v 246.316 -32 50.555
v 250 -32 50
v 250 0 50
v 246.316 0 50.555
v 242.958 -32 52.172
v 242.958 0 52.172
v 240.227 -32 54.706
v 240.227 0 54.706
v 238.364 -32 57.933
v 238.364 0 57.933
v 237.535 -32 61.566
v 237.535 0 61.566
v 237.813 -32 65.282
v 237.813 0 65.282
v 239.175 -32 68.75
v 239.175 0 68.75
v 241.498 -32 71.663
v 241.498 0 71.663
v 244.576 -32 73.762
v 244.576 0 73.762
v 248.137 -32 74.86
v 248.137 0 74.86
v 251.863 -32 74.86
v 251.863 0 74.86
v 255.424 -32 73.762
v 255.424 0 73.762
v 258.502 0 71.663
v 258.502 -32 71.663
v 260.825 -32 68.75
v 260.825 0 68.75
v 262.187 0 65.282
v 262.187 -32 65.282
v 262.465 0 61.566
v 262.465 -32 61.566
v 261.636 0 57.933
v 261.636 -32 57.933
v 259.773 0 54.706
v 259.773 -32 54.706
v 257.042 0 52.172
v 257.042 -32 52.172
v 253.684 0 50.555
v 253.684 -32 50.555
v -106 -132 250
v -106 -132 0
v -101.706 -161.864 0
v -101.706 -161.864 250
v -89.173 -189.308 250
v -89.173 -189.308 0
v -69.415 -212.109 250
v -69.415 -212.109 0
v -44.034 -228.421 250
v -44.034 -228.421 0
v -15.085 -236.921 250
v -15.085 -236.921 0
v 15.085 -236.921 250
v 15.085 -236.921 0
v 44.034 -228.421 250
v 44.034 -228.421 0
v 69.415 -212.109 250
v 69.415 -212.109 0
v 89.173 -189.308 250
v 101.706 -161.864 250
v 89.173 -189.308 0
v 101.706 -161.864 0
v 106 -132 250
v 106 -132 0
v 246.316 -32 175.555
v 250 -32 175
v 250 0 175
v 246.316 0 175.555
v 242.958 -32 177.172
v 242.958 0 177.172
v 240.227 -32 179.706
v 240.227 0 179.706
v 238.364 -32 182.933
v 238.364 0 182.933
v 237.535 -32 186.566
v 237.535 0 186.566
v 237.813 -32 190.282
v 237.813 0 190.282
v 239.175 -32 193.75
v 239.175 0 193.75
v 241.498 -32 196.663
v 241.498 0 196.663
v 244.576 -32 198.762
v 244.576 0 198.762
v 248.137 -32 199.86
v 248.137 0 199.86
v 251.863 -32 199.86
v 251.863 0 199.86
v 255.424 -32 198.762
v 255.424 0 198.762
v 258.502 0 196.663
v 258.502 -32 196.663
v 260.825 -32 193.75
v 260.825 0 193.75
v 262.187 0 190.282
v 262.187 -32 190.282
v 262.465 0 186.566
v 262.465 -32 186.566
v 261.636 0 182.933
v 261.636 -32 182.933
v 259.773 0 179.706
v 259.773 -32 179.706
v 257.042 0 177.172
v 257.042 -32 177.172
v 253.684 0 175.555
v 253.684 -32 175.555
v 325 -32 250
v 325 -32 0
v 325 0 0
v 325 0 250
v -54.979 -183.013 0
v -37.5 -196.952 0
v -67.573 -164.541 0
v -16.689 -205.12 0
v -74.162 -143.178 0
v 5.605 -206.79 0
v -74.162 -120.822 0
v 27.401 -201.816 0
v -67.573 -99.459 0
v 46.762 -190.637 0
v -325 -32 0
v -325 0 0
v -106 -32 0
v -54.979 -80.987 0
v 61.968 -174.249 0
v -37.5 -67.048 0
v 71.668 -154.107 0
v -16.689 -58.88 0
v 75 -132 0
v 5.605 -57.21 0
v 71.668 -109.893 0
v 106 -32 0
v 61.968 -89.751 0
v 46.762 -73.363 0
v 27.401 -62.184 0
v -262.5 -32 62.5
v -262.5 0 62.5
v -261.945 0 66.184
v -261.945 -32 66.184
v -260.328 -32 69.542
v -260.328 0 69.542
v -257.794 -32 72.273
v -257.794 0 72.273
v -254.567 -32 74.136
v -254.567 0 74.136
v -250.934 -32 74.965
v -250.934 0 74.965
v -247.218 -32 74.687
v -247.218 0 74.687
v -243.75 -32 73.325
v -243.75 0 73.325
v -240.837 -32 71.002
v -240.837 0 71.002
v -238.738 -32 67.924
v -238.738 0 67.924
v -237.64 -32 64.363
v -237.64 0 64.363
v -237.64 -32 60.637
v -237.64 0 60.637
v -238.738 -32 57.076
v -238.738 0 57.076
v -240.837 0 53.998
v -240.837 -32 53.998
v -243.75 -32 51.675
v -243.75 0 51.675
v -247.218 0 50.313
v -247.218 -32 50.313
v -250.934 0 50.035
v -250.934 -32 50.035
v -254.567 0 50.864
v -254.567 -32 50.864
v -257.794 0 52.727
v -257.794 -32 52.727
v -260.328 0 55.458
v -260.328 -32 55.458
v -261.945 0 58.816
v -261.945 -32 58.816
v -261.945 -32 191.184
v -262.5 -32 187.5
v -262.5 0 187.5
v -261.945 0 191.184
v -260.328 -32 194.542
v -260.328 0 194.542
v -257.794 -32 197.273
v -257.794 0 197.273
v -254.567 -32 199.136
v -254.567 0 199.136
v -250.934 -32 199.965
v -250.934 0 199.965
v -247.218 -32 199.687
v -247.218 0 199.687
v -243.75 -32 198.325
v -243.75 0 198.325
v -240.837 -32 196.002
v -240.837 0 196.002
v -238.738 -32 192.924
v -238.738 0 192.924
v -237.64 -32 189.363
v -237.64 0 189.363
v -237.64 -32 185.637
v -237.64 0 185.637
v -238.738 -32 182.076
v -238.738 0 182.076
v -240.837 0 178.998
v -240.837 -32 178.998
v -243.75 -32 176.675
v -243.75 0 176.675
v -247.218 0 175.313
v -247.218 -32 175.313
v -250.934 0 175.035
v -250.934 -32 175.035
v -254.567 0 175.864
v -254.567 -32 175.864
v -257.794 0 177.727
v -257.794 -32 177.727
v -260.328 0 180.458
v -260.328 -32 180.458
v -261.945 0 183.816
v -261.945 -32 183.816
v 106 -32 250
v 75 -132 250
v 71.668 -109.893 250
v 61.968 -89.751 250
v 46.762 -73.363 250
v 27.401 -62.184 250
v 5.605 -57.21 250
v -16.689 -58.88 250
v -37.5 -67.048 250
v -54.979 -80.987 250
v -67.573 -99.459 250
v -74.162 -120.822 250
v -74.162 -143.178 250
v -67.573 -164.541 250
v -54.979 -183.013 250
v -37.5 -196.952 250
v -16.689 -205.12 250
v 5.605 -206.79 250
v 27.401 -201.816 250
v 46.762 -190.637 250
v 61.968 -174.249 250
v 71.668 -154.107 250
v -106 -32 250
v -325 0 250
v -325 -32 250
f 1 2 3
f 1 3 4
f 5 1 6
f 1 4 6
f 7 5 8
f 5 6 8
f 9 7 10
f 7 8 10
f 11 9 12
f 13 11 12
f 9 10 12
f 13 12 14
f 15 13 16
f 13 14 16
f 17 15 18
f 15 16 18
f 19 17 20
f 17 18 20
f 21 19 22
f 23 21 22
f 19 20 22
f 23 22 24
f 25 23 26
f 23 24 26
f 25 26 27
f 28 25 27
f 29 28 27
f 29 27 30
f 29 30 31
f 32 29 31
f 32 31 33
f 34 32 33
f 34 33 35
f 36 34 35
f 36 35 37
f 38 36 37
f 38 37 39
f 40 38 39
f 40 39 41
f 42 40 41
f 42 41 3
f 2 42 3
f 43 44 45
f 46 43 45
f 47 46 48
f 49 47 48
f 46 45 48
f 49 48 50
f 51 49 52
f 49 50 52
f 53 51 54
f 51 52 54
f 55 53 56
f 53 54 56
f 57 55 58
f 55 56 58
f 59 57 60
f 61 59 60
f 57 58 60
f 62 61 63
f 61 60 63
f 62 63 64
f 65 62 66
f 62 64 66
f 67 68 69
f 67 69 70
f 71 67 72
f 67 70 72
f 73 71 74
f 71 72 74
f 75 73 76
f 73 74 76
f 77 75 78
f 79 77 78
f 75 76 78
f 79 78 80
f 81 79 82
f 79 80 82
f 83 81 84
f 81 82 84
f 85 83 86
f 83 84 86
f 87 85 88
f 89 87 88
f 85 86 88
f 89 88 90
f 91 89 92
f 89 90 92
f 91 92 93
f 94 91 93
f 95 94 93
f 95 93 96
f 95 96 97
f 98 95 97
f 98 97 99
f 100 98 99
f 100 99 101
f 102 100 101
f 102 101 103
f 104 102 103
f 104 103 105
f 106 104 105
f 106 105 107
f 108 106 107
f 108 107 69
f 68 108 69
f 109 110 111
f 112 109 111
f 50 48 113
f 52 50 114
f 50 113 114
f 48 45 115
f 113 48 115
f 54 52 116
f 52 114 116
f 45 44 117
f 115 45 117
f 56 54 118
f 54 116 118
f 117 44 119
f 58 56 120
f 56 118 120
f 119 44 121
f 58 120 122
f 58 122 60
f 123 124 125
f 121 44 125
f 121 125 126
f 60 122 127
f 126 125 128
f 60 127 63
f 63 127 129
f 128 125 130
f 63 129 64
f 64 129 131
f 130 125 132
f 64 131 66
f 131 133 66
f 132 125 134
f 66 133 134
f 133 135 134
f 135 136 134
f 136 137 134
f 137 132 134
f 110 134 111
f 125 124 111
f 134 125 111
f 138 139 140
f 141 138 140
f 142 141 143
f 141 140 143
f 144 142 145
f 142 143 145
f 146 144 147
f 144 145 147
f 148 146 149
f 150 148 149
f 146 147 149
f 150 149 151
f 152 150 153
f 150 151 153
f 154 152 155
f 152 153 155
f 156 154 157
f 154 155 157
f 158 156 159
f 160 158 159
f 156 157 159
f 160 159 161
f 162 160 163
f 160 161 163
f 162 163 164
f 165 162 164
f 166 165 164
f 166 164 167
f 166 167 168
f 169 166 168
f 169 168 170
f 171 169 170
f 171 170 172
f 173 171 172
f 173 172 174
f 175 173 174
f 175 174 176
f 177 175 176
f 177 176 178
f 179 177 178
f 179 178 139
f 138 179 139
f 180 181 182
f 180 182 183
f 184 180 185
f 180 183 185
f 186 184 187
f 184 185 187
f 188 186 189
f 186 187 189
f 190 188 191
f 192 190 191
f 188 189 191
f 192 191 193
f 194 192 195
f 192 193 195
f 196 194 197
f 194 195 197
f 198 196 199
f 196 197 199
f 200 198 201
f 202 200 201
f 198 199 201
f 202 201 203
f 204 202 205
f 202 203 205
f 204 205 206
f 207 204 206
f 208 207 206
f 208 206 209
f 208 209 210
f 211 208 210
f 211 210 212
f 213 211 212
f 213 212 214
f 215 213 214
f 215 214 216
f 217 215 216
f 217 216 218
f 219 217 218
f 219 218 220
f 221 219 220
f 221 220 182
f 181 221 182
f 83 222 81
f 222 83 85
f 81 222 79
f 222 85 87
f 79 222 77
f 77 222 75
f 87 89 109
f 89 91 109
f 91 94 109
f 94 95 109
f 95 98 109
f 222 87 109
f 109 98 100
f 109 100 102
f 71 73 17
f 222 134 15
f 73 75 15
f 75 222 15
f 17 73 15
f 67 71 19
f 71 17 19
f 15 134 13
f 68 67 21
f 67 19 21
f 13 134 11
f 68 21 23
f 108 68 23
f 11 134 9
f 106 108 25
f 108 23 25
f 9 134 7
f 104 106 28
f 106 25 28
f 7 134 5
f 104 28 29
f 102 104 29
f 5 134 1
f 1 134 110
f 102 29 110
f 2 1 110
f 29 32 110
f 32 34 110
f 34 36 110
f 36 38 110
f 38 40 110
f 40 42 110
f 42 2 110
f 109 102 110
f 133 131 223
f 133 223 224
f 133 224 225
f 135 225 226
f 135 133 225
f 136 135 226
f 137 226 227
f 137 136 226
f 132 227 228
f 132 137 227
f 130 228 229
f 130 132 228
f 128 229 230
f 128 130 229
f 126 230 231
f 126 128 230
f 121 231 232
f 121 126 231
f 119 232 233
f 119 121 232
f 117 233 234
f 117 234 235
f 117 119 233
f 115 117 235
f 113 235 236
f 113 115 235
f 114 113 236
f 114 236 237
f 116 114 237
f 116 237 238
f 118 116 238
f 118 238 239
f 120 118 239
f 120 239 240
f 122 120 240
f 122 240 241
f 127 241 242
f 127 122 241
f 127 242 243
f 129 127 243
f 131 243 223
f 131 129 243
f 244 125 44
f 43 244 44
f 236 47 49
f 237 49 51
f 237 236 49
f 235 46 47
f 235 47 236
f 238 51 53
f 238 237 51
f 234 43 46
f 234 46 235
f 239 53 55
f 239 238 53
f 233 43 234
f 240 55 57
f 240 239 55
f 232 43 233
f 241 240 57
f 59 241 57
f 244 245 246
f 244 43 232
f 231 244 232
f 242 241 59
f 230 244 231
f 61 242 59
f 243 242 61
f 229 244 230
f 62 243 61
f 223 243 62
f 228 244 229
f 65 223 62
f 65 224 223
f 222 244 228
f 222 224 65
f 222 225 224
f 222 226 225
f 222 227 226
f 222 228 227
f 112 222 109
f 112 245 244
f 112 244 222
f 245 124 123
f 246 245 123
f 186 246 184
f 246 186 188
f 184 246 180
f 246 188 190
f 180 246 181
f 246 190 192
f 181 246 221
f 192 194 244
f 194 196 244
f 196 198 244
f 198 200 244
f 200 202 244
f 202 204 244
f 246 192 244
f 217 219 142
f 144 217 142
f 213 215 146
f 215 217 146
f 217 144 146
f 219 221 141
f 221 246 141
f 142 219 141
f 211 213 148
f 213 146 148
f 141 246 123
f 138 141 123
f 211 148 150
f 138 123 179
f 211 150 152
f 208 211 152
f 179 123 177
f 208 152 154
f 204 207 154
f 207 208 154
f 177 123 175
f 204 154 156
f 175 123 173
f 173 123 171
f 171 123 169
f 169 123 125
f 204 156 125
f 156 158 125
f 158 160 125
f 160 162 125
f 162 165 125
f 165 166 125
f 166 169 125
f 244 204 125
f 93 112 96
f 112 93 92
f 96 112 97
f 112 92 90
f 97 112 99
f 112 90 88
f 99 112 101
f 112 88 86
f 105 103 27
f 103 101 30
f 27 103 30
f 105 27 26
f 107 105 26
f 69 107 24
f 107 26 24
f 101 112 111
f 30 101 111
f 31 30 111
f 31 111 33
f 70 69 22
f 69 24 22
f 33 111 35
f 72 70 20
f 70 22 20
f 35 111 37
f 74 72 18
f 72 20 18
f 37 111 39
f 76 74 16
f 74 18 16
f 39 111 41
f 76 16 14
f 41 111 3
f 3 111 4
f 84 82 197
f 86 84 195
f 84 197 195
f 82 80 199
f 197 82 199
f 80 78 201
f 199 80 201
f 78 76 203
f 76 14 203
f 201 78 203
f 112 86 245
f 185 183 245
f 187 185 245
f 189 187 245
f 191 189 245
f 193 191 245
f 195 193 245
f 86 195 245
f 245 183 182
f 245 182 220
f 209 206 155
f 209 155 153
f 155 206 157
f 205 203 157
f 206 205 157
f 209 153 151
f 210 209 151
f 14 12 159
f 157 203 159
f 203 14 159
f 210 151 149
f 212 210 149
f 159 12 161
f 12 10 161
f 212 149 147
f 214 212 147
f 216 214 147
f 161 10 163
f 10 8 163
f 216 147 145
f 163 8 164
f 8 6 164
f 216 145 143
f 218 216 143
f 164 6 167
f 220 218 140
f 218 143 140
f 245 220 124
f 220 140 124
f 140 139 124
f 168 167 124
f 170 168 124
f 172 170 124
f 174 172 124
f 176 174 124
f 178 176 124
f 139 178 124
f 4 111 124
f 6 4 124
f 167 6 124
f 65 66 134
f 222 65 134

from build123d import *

# Parameters (mm, degrees)
SKETCH1_R           = 75
BOSS_EXTRUDE1_DEPTH = 250
SKETCH2_R           = 12.5
CUT_EXTRUDE1_DEPTH  = 250


with BuildPart() as part:
    # Sketch1 → Boss-Extrude1 (new body)
    with BuildSketch(Plane.XY):
        with BuildLine():
            Line((325, 0), (-325, 0))
            Line((-325, 0), (-325, -32))
            Line((-325, -32), (-106, -32))
            Line((-106, -32), (-106, -132))
            ThreePointArc((-106, -132), (0, -238), (106, -132))
            Line((106, -132), (106, -32))
            Line((106, -32), (325, -32))
            Line((325, -32), (325, 0))
        make_face()
        with Locations((0, -132)):
            Circle(SKETCH1_R, mode=Mode.SUBTRACT)
    extrude(amount=BOSS_EXTRUDE1_DEPTH)

    # Sketch2 → Cut-Extrude1 (cut)
    with BuildSketch(Plane(origin=(0, 0, 0), x_dir=(1, 0, 0), z_dir=(0, 1, 0))):
        with Locations(Location((-250, -187.5, 0), (0, 0, 180))):  # turned: the seam where the file's is
            Circle(SKETCH2_R)
        with Locations(Location((-250, -62.5, 0), (0, 0, 180))):  # turned: the seam where the file's is
            Circle(SKETCH2_R)
        with Locations(Location((250, -187.5, 0), (0, 0, 90))):  # turned: the seam where the file's is
            Circle(SKETCH2_R)
        with Locations(Location((250, -62.5, 0), (0, 0, 90))):  # turned: the seam where the file's is
            Circle(SKETCH2_R)
    extrude(amount=-CUT_EXTRUDE1_DEPTH, mode=Mode.SUBTRACT)


solid = part.part
